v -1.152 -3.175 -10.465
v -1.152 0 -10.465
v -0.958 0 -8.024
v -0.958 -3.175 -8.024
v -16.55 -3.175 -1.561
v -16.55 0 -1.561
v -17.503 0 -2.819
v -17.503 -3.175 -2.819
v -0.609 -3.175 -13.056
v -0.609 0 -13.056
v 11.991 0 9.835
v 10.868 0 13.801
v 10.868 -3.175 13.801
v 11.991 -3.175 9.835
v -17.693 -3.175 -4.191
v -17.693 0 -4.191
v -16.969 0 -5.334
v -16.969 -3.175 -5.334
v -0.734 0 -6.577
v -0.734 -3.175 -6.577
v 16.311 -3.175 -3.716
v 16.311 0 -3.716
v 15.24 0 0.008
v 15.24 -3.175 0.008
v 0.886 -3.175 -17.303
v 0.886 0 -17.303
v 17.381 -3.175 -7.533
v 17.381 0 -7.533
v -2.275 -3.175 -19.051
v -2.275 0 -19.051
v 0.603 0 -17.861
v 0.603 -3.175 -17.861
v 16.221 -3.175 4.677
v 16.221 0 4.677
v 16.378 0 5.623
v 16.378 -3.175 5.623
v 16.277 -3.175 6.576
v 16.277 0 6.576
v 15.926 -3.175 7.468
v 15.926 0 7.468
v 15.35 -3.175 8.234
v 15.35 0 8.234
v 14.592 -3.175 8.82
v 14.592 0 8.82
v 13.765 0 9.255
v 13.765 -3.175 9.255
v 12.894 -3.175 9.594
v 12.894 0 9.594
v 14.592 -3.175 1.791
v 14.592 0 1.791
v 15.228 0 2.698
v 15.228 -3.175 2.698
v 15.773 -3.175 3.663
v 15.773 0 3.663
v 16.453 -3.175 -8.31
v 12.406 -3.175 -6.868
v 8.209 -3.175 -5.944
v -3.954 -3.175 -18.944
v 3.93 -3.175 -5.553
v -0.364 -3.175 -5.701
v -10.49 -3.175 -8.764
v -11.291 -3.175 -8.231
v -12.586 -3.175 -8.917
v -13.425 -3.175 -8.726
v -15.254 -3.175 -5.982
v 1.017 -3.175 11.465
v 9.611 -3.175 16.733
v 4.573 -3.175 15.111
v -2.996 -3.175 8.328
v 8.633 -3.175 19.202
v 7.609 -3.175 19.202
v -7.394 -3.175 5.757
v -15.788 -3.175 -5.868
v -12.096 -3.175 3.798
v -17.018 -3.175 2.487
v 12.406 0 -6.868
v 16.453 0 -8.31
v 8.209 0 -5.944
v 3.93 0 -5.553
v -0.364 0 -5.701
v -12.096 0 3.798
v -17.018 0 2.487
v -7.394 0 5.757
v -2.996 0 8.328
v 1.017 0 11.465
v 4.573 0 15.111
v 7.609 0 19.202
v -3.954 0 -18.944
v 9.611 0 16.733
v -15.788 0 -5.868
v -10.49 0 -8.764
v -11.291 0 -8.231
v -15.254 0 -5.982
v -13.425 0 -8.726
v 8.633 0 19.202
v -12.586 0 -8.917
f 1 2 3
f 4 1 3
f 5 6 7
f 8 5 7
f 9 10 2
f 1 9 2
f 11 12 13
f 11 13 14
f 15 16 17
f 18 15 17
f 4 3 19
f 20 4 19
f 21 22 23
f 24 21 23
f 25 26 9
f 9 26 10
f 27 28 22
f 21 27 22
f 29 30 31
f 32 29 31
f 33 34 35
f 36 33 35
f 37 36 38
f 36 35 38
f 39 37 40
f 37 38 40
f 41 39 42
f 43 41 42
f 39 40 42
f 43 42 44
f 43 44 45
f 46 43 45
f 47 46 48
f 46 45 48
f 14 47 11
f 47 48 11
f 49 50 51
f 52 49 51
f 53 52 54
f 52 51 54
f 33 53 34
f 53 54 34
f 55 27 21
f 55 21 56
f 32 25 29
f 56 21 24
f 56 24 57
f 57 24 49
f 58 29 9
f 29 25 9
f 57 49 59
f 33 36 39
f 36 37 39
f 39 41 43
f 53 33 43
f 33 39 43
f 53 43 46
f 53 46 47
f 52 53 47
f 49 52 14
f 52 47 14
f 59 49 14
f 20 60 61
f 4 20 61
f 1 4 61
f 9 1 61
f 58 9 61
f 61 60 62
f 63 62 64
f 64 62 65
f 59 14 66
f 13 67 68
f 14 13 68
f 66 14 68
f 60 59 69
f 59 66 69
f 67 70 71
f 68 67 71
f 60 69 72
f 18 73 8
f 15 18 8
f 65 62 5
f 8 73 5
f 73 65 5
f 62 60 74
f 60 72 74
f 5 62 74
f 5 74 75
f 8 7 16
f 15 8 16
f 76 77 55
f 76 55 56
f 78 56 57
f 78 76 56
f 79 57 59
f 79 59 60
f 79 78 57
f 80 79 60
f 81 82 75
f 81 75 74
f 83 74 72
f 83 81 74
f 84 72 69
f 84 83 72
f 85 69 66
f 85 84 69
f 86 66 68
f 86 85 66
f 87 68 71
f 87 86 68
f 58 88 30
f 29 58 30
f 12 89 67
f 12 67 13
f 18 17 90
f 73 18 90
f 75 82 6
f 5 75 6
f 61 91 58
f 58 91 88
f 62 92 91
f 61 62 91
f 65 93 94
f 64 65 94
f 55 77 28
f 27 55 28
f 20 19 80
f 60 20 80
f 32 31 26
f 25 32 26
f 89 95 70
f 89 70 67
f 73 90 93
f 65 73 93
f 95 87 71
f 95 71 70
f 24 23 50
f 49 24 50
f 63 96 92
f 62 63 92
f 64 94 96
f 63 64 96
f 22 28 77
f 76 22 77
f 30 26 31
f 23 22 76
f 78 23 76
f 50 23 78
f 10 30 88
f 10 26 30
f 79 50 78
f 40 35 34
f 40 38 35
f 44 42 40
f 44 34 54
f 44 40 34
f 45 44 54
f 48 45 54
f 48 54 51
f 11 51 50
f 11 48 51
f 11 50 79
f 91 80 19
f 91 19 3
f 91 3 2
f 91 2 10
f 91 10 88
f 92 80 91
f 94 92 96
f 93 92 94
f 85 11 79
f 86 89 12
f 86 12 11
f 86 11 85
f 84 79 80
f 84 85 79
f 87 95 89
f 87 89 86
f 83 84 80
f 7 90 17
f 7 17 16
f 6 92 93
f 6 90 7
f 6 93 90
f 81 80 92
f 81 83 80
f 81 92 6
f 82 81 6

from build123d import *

# Parameters (mm, degrees)
PAD_DEPTH = 3.175


with BuildPart() as part:
    # Sketch → Pad (new body)
    with BuildSketch(Plane.XZ):
        with BuildLine():
            ThreePointArc((-17.018, 2.487326), (-2.996285, 8.327774), (7.609137, 19.201797))
            Line((7.609137, 19.201797), (8.633146, 19.201797))
            Line((8.633146, 19.201797), (9.610686, 16.733412))
            Line((9.610686, 16.733412), (10.867529, 13.800783))
            Line((10.867529, 13.800783), (11.991159, 9.834628))
            ThreePointArc((14.591504, 8.819976), (13.334049, 9.436779), (11.991159, 9.834628))
            ThreePointArc((16.220824, 4.677015), (16.131692, 7.033827), (14.591504, 8.819976))
            ThreePointArc((14.5915, 1.790975), (15.512541, 3.173938), (16.220824, 4.677015))
            Line((15.24005, 0.007885), (14.5915, 1.790975))
            Line((16.310692, -3.716085), (15.24005, 0.007885))
            Line((17.381336, -7.533156), (16.310692, -3.716085))
            Line((16.453487, -8.310298), (17.381336, -7.533156))
            ThreePointArc((16.453487, -8.310298), (8.209274, -5.944046), (-0.364355, -5.701006))
            Line((-0.734469, -6.577293), (-0.364355, -5.701006))
            Line((-0.958348, -8.024061), (-0.734469, -6.577293))
            Line((-1.152321, -10.465385), (-0.958348, -8.024061))
            Line((-0.608809, -13.055986), (-1.152321, -10.465385))
            Line((0.885784, -17.303194), (-0.608809, -13.055986))
            Line((0.602916, -17.861423), (0.885784, -17.303194))
            Line((-2.274875, -19.050779), (0.602916, -17.861423))
            Line((-3.953837, -18.944079), (-2.274875, -19.050779))
            Line((-10.490349, -8.764157), (-3.953837, -18.944079))
            Line((-11.290691, -8.230595), (-10.490349, -8.764157))
            Line((-12.586489, -8.916603), (-11.290691, -8.230595))
            Line((-13.424941, -8.726046), (-12.586489, -8.916603))
            Line((-15.254302, -5.982009), (-13.424941, -8.726046))
            Line((-15.787862, -5.867674), (-15.254302, -5.982009))
            Line((-16.969324, -5.334111), (-15.787862, -5.867674))
            Line((-17.693443, -4.190763), (-16.969324, -5.334111))
            Line((-17.502886, -2.818745), (-17.693443, -4.190763))
            Line((-16.550095, -1.561061), (-17.502886, -2.818745))
            Line((-17.018, 2.487326), (-16.550095, -1.561061))
        make_face()
    extrude(amount=PAD_DEPTH)


solid = part.part
